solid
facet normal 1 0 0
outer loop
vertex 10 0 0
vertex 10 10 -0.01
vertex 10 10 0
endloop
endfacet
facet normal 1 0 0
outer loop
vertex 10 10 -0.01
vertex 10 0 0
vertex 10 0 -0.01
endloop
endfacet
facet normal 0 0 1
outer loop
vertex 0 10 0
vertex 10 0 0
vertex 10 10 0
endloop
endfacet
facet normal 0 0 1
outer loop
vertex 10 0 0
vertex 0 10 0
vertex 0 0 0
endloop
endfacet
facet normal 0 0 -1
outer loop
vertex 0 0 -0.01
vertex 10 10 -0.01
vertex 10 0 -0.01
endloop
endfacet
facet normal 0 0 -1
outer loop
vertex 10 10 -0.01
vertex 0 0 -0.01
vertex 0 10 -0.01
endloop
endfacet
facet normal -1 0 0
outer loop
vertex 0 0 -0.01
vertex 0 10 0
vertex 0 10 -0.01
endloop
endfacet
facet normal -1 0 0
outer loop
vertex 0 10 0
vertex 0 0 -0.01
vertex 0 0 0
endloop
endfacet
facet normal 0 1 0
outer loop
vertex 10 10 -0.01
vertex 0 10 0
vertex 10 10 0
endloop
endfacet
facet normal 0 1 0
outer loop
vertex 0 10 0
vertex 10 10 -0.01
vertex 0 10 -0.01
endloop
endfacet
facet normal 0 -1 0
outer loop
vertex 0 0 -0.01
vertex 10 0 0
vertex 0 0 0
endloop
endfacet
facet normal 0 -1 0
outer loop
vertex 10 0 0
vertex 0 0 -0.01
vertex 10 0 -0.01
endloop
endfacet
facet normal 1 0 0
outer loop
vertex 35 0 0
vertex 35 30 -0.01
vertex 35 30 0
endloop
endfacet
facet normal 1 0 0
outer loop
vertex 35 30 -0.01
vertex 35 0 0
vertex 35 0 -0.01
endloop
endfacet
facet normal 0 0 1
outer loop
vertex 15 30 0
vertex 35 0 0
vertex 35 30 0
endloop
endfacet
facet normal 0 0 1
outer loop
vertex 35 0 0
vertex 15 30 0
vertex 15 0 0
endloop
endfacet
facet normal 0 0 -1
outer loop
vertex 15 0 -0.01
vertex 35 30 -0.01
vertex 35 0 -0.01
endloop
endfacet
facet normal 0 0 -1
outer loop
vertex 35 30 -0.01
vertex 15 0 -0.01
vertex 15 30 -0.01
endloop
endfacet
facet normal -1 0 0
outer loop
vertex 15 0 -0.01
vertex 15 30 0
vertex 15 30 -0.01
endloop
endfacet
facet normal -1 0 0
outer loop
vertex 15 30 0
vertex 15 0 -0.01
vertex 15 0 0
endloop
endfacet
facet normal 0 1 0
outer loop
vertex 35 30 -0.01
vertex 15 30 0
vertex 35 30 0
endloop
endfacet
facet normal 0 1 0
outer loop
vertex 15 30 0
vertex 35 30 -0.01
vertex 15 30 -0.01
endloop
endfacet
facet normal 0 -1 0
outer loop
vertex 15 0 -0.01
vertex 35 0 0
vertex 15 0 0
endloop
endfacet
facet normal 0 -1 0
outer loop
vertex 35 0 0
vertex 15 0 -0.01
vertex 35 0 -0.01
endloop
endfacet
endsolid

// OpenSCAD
// file: ../../Base/Boxes.scad
// Fischertechnik Box Foundation
// Pre-designed Boxes

use <Constants.scad>

include <PlacementOptions.scad>

box190Width = 190;
box190Depth = 130;
box130Width = 130;
box130Depth = 95;
boxUsageHeight = 33.9;
boxWallThickness = 2.4;
boxBaseThickness = 1.0;

// getBoxWallThickness()
// Gets the wall thickness of a Fischertechnik Box

function getBoxWallThickness() = boxWallThickness;

// Gets the usable height of a fischertechnik box
function getBoxUsageHeight() = boxUsageHeight;

// Gets the thickness of the Fischertechnik box base.
function getBoxBaseThickness() = boxBaseThickness;

// Gets the usable inner space of a Box 190 as an x/y-list
function getBox190Space() = [
    box190Width - 2*getBoxWallThickness(), 
    box190Depth - 2*getBoxWallThickness() ];

// Imports the Fischertechnik empty box 130x190 mm and places it at position 0,0
// 190x130 are the outer sizes, the inner space is slightly smaller. Use getBox190Space() to get the inner sizes.
// This module needs the STL file "Fischertechnik Box 130x190.stl" in the library path.
// The box is positioned that the usable inner space is at the 0,0,0 position. The

module Box190() {
    translate([-getBoxWallThickness(),-getBoxWallThickness(),-getBoxBaseThickness()])
        import("Fischertechnik Box 130x190.stl", convexity=3);
}

// Gets the usable inner space of a Box 130 as an x/y-list
function getBox130Space() = [
    box130Width - 2*getBoxWallThickness(), 
    box130Depth - 2*getBoxWallThickness() ];

// Imports the Fischertechnik empty box 95x130 mm and places it at position 0,0
// 190x130 are the outer sizes, the inner space is slightly smaller. Use getBox190Space() to get the inner sizes.
// This module needs the STL file "Fischertechnik Box 95x130.stl" in the library path.
// The box is positioned that the usable inner space is at the 0,0,0 position. The

module Box130() {
    translate([-getBoxWallThickness(),-getBoxWallThickness(),-getBoxBaseThickness()])
        import("Fischertechnik Box 95x130.stl", convexity=3);
}

// Creates a web at the specified box walls
// corner 0 = LowerLeft, 1 = UpperLeft, 2 = UpperRight, 3 = LowerRight
// side 0 = LeftOfCorner, 1 = RightOfCorner
// distance = Distance in mm from the corner
// box = inner width and depth of the box (default: Box 190)
// webWidth = length of the web (default is 3 mms)
// webThickness = thickness of the web (default is 1 mm)

module BoxWeb(corner, side, distance, box=getBox190Space(), webWidth=3, webThickness=1.0) {
    sink = getBoxWallThickness()/2;

    width = (corner % 2 == 0) ? 
            (side == LeftOfCorner ? webWidth : webThickness) :
            (side == LeftOfCorner ? webThickness : webWidth);

    depth = (corner % 2 == 0) ? 
            (side == RightOfCorner ? webWidth : webThickness) :
            (side == RightOfCorner ? webThickness : webWidth);
    
    xDiff = corner == LowerLeft ? 
                (side == LeftOfCorner ? -sink : distance) :
            (corner == UpperLeft ?                
                (side == LeftOfCorner ? distance : -sink) :
            (corner == UpperRight ?
                (side == LeftOfCorner ? box.x-webWidth+sink : box.x-distance-webThickness) :
                (side == LeftOfCorner ? box.x-distance-webThickness: box.x-webWidth+sink)));

    yDiff = corner == LowerLeft ? 
                (side == RightOfCorner ? -sink : distance) :
            (corner == UpperLeft ?
                (side == RightOfCorner ? box.y-distance : box.y-webWidth+sink) :
            (corner == UpperRight ?
                (side == RightOfCorner ? box.y-webWidth+sink : box.y-distance) :
                (side == RightOfCorner ? distance : -sink)));
    
    translate([xDiff, yDiff, -getExcess()])
        cube([width, depth, boxUsageHeight + 2*getExcess()]);
}
// file: ../../Base/Rotation.scad
// Fischertechnik Box Foundation
// Geometry Helpers Rotation

include <PlacementOptions.scad>

// getRotatedSpace(space, rotation=NoRotation)
// Rotates the space dependent on the specified rotation

function getRotatedSpace(space, rotation=NoRotation) = [
    (rotation == Rotate90 || rotation == Rotate270) ? space.y : space.x,
    (rotation == Rotate90 || rotation == Rotate270) ? space.x : space.y
];

// Rotates the given space around the fixed left lower corner
// space = the space the children needs as width/depth list [width,depth]
// rotation = 0 Rotate0 degrees, 1 Rotate90 degrees, 2 Rotate180 degrees, 3 Rotate270 degrees (equivalent to -90)

module RotateFix(space, rotation=Rotate0) {
    dy = (rotation == Rotate0 || rotation == Rotate270) ? 0 :
        (rotation == Rotate90) ? space.x :
        space.y;
    dx = (rotation < Rotate180) ? 0 :
        (rotation == Rotate180) ? space.x :
        space.y;
    
    translate([dx, dy, 0])
        rotate([0, 0, rotations[rotation]])
            children();
}
// file: ../../Base/Alignment.scad
// Fischertechnik Box Foundation
// Geometry Helpers Alignment

include <PlacementOptions.scad>

// getAlignedX(elementWidth, spaceWidth, align=AlignRight, offset=0)
// Gets the aligned X offset of an element with the given
// width in the given space.
// elementWidth = The width of the element to positon
// spaceWidth = The space where the element should be aligned
// align = 0 AlignLeft, 1 AlignCenter, 2 AlignRight
// offset = an optional offset from the aligned position. When
// aligned left or centered, then positive values are in X direction.
// When aligned right then positive values are in negative X direction.

function getAlignedX(elementWidth, spaceWidth, align=AlignRight, offset=0) =
    (align == AlignLeft) ?
        offset :
        ((align == AlignCenter) ?
        (spaceWidth - elementWidth)/2 + offset :
        spaceWidth - offset - elementWidth);

// getAlignedY(elementDepth, spaceDepth, align=AlignTop, offset=0)
// Gets the aligned Y offset of an element with the given
// depth in the given space.
// elementDepth = The depth of the element to positon
// spaceDepth = The space where the element should be aligned
// align = 0 AlignBottom, 1 AlignCenter, 2 AlignTop
// offset = an optional offset from the aligned position. When
// aligned bottom or centered, then positive values are in Y direction.
// When aligned top then positive values are in negative Y direction.

function getAlignedY(elementDepth, spaceDepth, align=AlignTop, offset=0) =
    (align == AlignBottom) ?
        offset :
        ((align == AlignCenter) ?
        (spaceDepth - elementDepth)/2 + offset :
        spaceDepth - offset - elementDepth);
// file: ../../Base/PlacementOptions.scad
// Fischertechnik Box Foundation
// Placement Options

// Alignment
NoAlign = 0;
AlignLeft = 1;
AlignBottom = 2;
AlignCenter = 3;
AlignRight = 4;
AlignTop = 5;

// Element rotation degree steps
rotations = [0, -90, -180, -270];

// Rotation
NoRotation = 0;
Rotate0 = 0;
Rotate90 = 1;
Rotate180 = 2;
Rotate270 = 3;

// Docking (seen from above)
NoDock = -1;
DockLeft = 0;
DockTop = 1;
DockRight = 2;
DockCorner = 2;
DockBottom = 3;

// Web corners
LowerLeft = 0;
UpperLeft = 1;
UpperRight = 2;
LowerRight = 3;

// Web position relative to corner
LeftOfCorner = 0;
RightOfCorner = 1;
// file: ../../Base/Placement.scad
// Fischertechnik Box Foundation
// Geometry Helpers Placement

use <Constants.scad>
use <Alignment.scad>
use <Rotation.scad>
use <Boxes.scad>

include <PlacementOptions.scad>

// Place(x=0, y=0, elementSpace=[0,0], alignX=AlignLeft, alignY=AlignBottom, rotation=Rotate0, boxSpace=getBox190Space())
// Places the child at the specified position
// y = Y-Position. This is a relative position when an X aligment is specified.
// x = X-Position. This is a relative position when an Y aligment is specified.
// elementSpace = space of the element to be placed [x,y]
// alignX = -1=NoAlign, 0 AlignLeft, 1 AlignCenter, 3 AlignRight (elementSpace and boxSpace required!)
// alignY = -1=NoAlign, 2 AlignBottom, 1 AlignCenter, 4 AlignTop (elementSpace and boxSpace required!)
// rotation = 0 Rotate0 0 degrees, 1 Rotate90 90 degrees, 
// 2 Rotate180 180 degrees, 3 Rotate270 270 degrees (equivalent to -90)
// boxSpace = Inner space of the box where the placement occurs [x,y] - default is Box 190x130 inner space

module Place(x=0, y=0, elementSpace=[0,0], 
  alignX=AlignLeft, alignY=AlignBottom, 
  rotation=NoRotation, boxSpace=getBox190Space()) {

    module Position(x, y, space, rotation=Rotate0) {
        translate([x, y, 0])
            RotateFix(space, rotation)
                children(0);
    }

    space = getRotatedSpace(elementSpace, rotation);
    alignedX = getAlignedX(space.x, boxSpace.x, alignX, x);
    alignedY = getAlignedY(space.y, boxSpace.y, alignY, y);
    Position(alignedX, alignedY, elementSpace, rotation)
        children(0);
}

// Center(space=getBox130Space(), elementSpace=[0,0])
// space = Space where the children is centered. For cylinder use centered=true and no elementSpace.
// elementSpace = space of the element to be centered [x,y]

module Center(space=getBox190Space(), elementSpace=[0,0]) {
    translate([(space.x - elementSpace.x) / 2, (space.y - elementSpace.y) / 2])
        children(0);
}

// CenterHorizontal(width=0, y=0, offset=0, space=getBox130Space())
// space = Space where the children is centered. For cylinder use centered=true and no elementSpace.
// elementSpace = space of the element to be centered [x,y]

module CenterHorizontal(width=0, y=0, offset=0, space=getBox190Space()) {
    translate([(space.x - width) / 2 + offset, y])
        children(0);
}

// CenterVertical(depth=0, x=0, offset=0, space=getBox130Space())
// space = Space where the children is centered. For cylinder use centered=true and no elementSpace.
// elementSpace = space of the element to be centered [x,y]

module CenterVerticalal(depth=0, x=0, offset=0, space=getBox190Space()) {
    translate([x, (space.y - depth) / 2 + offset])
        children(0);
}
// file: ../../Base/Constants.scad
// Fischertechnik Box Foundation
// Constants

// Constant values necessary for multiple elements

// Base constants
dividerThickness = 1.2;
excess = 0.01;
fragments = 90;
tolerance = 0.8;

// Gets the thickness of a divider 
function getDividerThickness() = dividerThickness;

// Gets the excess that is used to merge walls into each other
function getExcess() = excess;

// Gets amount of fragments of a cylinder
function getFragments() = fragments;

// Gets the inner tolerance of a frame to each side
function getTolerance() = tolerance;


// Fischertechnik specific constants
axisDiameter = 4;
axisBottomDiameter = axisDiameter + 1;
standardEdgeDistance = 2.5;
standardWebDistance = 11.5;
standardCornerLength = 15;
tubeWallFactor = 1.6;

// Gets axis diameter
function getAxisDiameter() = axisDiameter;

// Gets axis bottom diameter for thicker part at the bottom
function getAxisBottomDiameter() = axisBottomDiameter;

// gets the standard distance to the wall of the box for dockable frames with webs
function getStandardEdgeDistance() = standardEdgeDistance;

// gets the standard distance of each web to the corner of the dockable frame
function getStandardWebDistance() = standardWebDistance;

// gets the standard length of the corner walls of a dockable frame
function getStandardCornerLength() = standardCornerLength;

// gets the wall thickness of a tube.
function getTubeWallThickness() = tubeWallFactor * getDividerThickness();
// main file
// Fischertechnik Box Foundation
// ModelBase
// Test Space

use <../../Base/Constants.scad>
use <../../ModelBase/Simple.scad>

Space([10,10]);

translate([15, 0, 0])
    Space([20,30]);
